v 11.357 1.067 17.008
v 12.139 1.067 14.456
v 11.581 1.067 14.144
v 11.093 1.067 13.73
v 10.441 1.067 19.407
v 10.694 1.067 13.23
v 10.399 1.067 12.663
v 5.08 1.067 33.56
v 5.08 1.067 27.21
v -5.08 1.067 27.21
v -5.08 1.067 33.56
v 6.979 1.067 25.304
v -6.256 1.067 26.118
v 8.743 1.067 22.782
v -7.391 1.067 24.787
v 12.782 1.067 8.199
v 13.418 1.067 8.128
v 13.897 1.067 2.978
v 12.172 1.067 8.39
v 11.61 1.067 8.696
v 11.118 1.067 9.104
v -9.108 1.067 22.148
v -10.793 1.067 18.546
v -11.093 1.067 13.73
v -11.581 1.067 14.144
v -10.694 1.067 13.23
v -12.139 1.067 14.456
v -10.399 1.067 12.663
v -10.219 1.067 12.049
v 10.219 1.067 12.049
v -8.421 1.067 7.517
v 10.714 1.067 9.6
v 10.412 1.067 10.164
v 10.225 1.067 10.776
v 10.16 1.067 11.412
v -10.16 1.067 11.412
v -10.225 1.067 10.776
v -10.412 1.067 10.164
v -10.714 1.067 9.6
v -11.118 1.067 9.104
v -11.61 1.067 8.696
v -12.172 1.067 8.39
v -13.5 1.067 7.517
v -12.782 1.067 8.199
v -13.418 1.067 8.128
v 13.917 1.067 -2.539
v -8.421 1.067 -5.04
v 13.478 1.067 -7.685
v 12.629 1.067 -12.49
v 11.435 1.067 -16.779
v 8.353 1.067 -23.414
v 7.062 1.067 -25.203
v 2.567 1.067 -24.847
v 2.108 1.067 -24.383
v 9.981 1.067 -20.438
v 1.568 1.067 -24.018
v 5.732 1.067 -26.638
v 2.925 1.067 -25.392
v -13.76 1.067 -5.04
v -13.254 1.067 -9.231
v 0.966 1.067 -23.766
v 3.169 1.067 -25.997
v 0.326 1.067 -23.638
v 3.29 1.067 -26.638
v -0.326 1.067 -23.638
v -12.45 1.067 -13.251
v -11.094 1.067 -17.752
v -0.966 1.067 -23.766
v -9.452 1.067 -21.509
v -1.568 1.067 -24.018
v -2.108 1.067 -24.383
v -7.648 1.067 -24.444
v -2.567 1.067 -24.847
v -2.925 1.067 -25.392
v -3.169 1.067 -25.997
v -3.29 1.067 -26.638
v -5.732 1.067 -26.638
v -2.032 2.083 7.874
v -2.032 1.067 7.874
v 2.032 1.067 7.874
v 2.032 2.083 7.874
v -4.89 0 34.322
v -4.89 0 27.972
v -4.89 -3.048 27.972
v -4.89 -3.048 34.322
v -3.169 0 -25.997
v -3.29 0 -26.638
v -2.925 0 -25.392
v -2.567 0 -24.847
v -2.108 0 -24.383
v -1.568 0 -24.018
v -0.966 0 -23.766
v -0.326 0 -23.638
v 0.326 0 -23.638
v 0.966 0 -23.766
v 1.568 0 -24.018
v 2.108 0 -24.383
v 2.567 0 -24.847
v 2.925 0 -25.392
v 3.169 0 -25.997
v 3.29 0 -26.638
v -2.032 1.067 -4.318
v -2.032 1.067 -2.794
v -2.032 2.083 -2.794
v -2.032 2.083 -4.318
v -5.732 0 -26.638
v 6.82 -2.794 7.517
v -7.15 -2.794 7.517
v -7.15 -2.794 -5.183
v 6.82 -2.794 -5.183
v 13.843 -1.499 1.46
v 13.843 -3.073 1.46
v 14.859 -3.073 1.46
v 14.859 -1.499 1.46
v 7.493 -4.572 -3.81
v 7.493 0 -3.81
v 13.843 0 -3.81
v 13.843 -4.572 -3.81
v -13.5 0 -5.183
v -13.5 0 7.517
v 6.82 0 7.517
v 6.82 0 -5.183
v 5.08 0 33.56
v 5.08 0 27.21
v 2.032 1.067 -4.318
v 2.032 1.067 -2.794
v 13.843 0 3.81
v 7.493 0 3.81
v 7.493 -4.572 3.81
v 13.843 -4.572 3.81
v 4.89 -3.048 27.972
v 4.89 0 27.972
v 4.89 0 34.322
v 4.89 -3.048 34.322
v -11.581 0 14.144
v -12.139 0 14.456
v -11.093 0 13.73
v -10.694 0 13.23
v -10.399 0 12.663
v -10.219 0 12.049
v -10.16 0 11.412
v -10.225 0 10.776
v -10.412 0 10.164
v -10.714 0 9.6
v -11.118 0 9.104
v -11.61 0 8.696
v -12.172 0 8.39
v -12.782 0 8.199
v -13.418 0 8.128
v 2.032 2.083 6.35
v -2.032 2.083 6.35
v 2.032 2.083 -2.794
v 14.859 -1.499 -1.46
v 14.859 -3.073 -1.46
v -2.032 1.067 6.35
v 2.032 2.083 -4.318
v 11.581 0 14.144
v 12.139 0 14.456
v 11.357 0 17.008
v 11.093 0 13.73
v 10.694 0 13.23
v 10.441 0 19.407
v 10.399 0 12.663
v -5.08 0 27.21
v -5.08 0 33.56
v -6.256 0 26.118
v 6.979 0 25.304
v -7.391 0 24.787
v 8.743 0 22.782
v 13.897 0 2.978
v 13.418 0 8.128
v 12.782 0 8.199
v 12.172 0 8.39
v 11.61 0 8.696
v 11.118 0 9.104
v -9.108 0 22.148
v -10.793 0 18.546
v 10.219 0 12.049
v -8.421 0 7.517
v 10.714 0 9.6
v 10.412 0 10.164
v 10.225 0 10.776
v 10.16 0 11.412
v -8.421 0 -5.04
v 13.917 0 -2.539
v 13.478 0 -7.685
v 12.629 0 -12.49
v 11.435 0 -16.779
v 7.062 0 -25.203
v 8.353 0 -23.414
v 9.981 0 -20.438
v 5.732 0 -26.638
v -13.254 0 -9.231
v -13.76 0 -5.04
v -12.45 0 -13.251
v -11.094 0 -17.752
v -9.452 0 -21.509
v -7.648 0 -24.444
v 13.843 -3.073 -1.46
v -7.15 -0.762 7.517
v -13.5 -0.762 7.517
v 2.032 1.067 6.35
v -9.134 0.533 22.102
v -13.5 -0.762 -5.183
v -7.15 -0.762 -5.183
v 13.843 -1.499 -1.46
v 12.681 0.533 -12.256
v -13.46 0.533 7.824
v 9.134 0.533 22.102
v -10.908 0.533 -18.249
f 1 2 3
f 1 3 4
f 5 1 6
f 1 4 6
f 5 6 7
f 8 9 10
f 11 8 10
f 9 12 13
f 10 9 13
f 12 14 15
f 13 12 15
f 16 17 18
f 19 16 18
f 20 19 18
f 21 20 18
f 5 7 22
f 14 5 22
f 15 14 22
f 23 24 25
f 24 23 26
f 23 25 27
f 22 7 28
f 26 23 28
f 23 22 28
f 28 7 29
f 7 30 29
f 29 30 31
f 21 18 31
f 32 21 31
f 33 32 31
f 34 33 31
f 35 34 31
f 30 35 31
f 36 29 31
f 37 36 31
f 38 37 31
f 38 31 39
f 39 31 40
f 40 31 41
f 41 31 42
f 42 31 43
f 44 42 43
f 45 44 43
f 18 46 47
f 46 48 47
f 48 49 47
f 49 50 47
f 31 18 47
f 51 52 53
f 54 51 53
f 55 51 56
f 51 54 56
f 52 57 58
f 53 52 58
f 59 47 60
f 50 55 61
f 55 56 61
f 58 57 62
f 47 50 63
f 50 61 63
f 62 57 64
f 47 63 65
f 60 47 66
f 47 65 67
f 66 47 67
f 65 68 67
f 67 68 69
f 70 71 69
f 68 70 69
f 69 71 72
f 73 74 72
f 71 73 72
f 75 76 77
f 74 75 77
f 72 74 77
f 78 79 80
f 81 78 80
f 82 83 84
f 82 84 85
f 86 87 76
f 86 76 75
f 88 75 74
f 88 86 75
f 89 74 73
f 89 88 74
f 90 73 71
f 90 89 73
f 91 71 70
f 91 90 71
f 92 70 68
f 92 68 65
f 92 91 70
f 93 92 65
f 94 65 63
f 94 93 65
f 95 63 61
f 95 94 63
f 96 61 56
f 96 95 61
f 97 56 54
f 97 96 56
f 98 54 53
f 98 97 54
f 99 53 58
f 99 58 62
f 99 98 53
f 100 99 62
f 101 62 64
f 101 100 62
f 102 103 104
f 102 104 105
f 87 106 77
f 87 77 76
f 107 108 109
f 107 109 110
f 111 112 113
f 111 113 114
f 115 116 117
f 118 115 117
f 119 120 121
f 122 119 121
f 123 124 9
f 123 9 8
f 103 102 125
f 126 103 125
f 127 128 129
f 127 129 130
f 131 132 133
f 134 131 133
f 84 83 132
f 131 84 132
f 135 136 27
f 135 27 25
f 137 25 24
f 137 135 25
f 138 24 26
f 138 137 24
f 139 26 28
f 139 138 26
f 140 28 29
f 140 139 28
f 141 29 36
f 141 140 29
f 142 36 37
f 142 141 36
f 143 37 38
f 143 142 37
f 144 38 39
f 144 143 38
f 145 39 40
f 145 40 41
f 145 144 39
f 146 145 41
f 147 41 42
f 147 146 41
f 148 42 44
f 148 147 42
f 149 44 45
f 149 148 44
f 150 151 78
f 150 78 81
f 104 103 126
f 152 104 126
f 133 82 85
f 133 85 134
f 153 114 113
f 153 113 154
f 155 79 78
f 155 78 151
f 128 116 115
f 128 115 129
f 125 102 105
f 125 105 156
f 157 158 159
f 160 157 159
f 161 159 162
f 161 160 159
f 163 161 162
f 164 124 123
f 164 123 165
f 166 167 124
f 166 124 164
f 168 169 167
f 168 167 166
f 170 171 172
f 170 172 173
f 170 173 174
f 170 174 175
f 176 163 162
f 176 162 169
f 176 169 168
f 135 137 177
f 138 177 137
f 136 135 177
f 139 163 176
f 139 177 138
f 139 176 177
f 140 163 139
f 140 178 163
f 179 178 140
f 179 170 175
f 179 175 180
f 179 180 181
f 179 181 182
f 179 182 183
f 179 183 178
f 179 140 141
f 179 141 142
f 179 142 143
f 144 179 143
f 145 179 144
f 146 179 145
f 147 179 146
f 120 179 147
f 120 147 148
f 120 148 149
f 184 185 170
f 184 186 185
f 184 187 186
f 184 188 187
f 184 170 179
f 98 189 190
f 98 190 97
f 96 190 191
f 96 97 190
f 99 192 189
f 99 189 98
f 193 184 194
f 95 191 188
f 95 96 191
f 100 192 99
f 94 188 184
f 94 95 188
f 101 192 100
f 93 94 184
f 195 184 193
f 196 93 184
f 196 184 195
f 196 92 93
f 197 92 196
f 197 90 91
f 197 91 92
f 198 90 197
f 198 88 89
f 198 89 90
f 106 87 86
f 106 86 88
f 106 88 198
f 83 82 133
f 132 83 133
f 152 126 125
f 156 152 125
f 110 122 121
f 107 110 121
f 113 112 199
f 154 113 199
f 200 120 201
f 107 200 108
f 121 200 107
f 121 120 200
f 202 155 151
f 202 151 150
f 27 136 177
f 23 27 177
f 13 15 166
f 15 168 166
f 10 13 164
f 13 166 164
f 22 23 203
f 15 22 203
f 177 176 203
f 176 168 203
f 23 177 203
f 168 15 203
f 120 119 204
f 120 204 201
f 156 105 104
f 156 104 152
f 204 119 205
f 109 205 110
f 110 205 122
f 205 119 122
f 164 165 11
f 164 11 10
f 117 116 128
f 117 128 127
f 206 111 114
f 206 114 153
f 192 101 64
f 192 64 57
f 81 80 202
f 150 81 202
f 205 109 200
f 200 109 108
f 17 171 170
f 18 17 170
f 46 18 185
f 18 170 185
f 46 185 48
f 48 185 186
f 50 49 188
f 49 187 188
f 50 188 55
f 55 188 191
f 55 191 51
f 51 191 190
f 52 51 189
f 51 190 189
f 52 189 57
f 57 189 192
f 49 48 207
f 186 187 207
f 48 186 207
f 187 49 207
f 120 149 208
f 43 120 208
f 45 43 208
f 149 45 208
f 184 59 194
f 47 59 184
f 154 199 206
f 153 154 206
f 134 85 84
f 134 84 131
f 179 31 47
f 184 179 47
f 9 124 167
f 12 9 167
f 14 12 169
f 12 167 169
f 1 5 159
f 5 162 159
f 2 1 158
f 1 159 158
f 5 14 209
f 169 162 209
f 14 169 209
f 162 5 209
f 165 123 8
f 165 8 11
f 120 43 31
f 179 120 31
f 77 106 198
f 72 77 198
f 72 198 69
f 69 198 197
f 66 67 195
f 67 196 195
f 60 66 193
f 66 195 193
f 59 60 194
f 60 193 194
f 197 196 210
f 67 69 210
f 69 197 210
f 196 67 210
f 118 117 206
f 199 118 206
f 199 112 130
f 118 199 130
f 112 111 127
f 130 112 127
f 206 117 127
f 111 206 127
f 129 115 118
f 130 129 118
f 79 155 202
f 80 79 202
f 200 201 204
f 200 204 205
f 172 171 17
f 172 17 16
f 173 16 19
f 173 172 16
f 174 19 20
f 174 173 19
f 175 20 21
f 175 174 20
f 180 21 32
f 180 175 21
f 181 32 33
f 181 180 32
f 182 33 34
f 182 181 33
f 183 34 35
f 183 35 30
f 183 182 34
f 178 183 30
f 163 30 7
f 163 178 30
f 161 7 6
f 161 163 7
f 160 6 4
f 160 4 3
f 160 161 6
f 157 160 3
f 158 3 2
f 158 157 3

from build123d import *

# Parameters (mm, degrees)
BAREBOARD_DEPTH       = 1.0668
SKETCH2_W             = 9.779
SKETCH2_H             = 6.35
USB_DEPTH             = 3.048
SKETCH3_W             = 4.064
SKETCH3_H             = 1.524
SIDEFIRE_LEDS_DEPTH   = 1.016
SIDEFIRE_LEDS_2_DEPTH = 1.016
SKETCH4_W             = 20.32
SKETCH4_H             = 12.7
BLE_RADIO_DEPTH       = 2.794
SKETCH5_W             = 6.35
SKETCH5_H             = 12.7
CUT_EXTRUDE1_DEPTH    = 2.032
SKETCH6_W             = 12.7
SKETCH6_H             = 12.556872392
CUT_EXTRUDE2_DEPTH    = 1.0668
SKETCH7_W             = 6.35
SKETCH7_H             = 7.62
BOSS_EXTRUDE1_DEPTH   = 4.572
SKETCH8_W             = 2.921
SKETCH8_H             = 1.5748
BOSS_EXTRUDE2_DEPTH   = 1.016


with BuildPart() as part:
    # Sketch1 → BareBoard (new body)
    with BuildSketch(Plane(origin=(0, 0, 0), x_dir=(1, 0, 0), z_dir=(0, 1, 0))):
        with BuildLine():
            Line((-5.73230473, 26.637688011), (-3.289563717, 26.637688011))
            ThreePointArc((-3.289563717, 26.637688011), (0, 23.622), (3.289563717, 26.637688011))
            Line((3.289563717, 26.637688011), (5.73230473, 26.637688011))
            add(Edge.make_bspline(
                [(13.418222154, -8.128290216), (16.793446356, 16.231228563), (5.73230473, 26.637688011)],
                knots=[4.430395644, 4.430395644, 4.430395644, 5.860369829, 5.860369829, 5.860369829], degree=2, weights=[1, 0.755101704, 1]))
            ThreePointArc((13.418222154, -8.128290216), (10.225448258, -10.775831196), (12.139365996, -14.455531902))
            add(Edge.make_bspline(
                [(5.08, -27.210311989), (9.690192264, -23.447439252), (12.139365996, -14.455531902)],
                knots=[3.513761188, 3.513761188, 3.513761188, 4.194688818, 4.194688818, 4.194688818], degree=2, weights=[1, 0.942599888, 1]))
            Line((5.08, -27.210311989), (5.08, -33.560311989))
            Line((5.08, -33.560311989), (-5.08, -33.560311989))
            Line((-5.08, -33.560311989), (-5.08, -27.210311989))
            add(Edge.make_bspline(
                [(-12.139365996, -14.455531902), (-9.690192264, -23.447439252), (-5.08, -27.210311989)],
                knots=[2.088496489, 2.088496489, 2.088496489, 2.76942412, 2.76942412, 2.76942412], degree=2, weights=[1, 0.942599888, 1]))
            ThreePointArc((-12.139365996, -14.455531902), (-10.225448258, -10.775831196), (-13.418222154, -8.128290216))
            add(Edge.make_bspline(
                [(-5.73230473, 26.637688011), (-16.793446356, 16.231228563), (-13.418222154, -8.128290216)],
                knots=[0.422815478, 0.422815478, 0.422815478, 1.852789663, 1.852789663, 1.852789663], degree=2, weights=[1, 0.755101704, 1]))
        make_face()
    extrude(amount=BAREBOARD_DEPTH)

    # Sketch6 → Cut-Extrude2 (cut)
    with BuildSketch(Plane(origin=(0, 1.0668, 0), x_dir=(1, 0, 0), z_dir=(0, 1, 0))):
        with Locations((-14.770961261, -1.238442872)):
            Rectangle(SKETCH6_W, SKETCH6_H)
    extrude(amount=-CUT_EXTRUDE2_DEPTH, mode=Mode.SUBTRACT)


with BuildPart() as body_2:
    # Sketch2 → USB (new body)
    with BuildSketch(Plane.XZ):
        with Locations((0, 31.147311989)):
            Rectangle(SKETCH2_W, SKETCH2_H)
    extrude(amount=USB_DEPTH)


with BuildPart() as body_3:
    # Sketch3 → SideFire LEDs (new body)
    with BuildSketch(Plane(origin=(0, 1.0668, 0), x_dir=(1, 0, 0), z_dir=(0, 1, 0))):
        with Locations((0, 3.556)):
            Rectangle(SKETCH3_W, SKETCH3_H)
    extrude(amount=SIDEFIRE_LEDS_DEPTH)


with BuildPart() as body_4:
    # Sketch3 → SideFire LEDs 2 (new body)
    with BuildSketch(Plane(origin=(0, 1.0668, 0), x_dir=(1, 0, 0), z_dir=(0, 1, 0))):
        with Locations((0, -7.112)):
            Rectangle(SKETCH3_W, SKETCH3_H)
    extrude(amount=SIDEFIRE_LEDS_2_DEPTH)


with BuildPart() as body_5:
    # Sketch4 → BLE Radio (new body)
    with BuildSketch(Plane.XZ):
        with Locations((-3.339506125, 1.166879068)):
            Rectangle(SKETCH4_W, SKETCH4_H)
    extrude(amount=BLE_RADIO_DEPTH)

    # Sketch5 → Cut-Extrude1 (cut)
    with BuildSketch(Plane.XZ.offset(2.794)):
        with Locations((-10.324506125, 1.166879068)):
            Rectangle(SKETCH5_W, SKETCH5_H)
    extrude(amount=-CUT_EXTRUDE1_DEPTH, mode=Mode.SUBTRACT)


with BuildPart() as body_6:
    # Sketch7 → Boss-Extrude1 (new body)
    with BuildSketch(Plane.XZ):
        with Locations((10.668, 0)):
            Rectangle(SKETCH7_W, SKETCH7_H)
    extrude(amount=BOSS_EXTRUDE1_DEPTH)

    # Sketch8 → Boss-Extrude2 (add)
    with BuildSketch(Plane(origin=(13.843, 0, 0), x_dir=(0, 0, -1), z_dir=(1, 0, 0))):
        with Locations((0, -2.286)):
            Rectangle(SKETCH8_W, SKETCH8_H)
    extrude(amount=BOSS_EXTRUDE2_DEPTH)


solid = Compound([part.part, body_2.part, body_3.part, body_4.part, body_5.part, body_6.part])
